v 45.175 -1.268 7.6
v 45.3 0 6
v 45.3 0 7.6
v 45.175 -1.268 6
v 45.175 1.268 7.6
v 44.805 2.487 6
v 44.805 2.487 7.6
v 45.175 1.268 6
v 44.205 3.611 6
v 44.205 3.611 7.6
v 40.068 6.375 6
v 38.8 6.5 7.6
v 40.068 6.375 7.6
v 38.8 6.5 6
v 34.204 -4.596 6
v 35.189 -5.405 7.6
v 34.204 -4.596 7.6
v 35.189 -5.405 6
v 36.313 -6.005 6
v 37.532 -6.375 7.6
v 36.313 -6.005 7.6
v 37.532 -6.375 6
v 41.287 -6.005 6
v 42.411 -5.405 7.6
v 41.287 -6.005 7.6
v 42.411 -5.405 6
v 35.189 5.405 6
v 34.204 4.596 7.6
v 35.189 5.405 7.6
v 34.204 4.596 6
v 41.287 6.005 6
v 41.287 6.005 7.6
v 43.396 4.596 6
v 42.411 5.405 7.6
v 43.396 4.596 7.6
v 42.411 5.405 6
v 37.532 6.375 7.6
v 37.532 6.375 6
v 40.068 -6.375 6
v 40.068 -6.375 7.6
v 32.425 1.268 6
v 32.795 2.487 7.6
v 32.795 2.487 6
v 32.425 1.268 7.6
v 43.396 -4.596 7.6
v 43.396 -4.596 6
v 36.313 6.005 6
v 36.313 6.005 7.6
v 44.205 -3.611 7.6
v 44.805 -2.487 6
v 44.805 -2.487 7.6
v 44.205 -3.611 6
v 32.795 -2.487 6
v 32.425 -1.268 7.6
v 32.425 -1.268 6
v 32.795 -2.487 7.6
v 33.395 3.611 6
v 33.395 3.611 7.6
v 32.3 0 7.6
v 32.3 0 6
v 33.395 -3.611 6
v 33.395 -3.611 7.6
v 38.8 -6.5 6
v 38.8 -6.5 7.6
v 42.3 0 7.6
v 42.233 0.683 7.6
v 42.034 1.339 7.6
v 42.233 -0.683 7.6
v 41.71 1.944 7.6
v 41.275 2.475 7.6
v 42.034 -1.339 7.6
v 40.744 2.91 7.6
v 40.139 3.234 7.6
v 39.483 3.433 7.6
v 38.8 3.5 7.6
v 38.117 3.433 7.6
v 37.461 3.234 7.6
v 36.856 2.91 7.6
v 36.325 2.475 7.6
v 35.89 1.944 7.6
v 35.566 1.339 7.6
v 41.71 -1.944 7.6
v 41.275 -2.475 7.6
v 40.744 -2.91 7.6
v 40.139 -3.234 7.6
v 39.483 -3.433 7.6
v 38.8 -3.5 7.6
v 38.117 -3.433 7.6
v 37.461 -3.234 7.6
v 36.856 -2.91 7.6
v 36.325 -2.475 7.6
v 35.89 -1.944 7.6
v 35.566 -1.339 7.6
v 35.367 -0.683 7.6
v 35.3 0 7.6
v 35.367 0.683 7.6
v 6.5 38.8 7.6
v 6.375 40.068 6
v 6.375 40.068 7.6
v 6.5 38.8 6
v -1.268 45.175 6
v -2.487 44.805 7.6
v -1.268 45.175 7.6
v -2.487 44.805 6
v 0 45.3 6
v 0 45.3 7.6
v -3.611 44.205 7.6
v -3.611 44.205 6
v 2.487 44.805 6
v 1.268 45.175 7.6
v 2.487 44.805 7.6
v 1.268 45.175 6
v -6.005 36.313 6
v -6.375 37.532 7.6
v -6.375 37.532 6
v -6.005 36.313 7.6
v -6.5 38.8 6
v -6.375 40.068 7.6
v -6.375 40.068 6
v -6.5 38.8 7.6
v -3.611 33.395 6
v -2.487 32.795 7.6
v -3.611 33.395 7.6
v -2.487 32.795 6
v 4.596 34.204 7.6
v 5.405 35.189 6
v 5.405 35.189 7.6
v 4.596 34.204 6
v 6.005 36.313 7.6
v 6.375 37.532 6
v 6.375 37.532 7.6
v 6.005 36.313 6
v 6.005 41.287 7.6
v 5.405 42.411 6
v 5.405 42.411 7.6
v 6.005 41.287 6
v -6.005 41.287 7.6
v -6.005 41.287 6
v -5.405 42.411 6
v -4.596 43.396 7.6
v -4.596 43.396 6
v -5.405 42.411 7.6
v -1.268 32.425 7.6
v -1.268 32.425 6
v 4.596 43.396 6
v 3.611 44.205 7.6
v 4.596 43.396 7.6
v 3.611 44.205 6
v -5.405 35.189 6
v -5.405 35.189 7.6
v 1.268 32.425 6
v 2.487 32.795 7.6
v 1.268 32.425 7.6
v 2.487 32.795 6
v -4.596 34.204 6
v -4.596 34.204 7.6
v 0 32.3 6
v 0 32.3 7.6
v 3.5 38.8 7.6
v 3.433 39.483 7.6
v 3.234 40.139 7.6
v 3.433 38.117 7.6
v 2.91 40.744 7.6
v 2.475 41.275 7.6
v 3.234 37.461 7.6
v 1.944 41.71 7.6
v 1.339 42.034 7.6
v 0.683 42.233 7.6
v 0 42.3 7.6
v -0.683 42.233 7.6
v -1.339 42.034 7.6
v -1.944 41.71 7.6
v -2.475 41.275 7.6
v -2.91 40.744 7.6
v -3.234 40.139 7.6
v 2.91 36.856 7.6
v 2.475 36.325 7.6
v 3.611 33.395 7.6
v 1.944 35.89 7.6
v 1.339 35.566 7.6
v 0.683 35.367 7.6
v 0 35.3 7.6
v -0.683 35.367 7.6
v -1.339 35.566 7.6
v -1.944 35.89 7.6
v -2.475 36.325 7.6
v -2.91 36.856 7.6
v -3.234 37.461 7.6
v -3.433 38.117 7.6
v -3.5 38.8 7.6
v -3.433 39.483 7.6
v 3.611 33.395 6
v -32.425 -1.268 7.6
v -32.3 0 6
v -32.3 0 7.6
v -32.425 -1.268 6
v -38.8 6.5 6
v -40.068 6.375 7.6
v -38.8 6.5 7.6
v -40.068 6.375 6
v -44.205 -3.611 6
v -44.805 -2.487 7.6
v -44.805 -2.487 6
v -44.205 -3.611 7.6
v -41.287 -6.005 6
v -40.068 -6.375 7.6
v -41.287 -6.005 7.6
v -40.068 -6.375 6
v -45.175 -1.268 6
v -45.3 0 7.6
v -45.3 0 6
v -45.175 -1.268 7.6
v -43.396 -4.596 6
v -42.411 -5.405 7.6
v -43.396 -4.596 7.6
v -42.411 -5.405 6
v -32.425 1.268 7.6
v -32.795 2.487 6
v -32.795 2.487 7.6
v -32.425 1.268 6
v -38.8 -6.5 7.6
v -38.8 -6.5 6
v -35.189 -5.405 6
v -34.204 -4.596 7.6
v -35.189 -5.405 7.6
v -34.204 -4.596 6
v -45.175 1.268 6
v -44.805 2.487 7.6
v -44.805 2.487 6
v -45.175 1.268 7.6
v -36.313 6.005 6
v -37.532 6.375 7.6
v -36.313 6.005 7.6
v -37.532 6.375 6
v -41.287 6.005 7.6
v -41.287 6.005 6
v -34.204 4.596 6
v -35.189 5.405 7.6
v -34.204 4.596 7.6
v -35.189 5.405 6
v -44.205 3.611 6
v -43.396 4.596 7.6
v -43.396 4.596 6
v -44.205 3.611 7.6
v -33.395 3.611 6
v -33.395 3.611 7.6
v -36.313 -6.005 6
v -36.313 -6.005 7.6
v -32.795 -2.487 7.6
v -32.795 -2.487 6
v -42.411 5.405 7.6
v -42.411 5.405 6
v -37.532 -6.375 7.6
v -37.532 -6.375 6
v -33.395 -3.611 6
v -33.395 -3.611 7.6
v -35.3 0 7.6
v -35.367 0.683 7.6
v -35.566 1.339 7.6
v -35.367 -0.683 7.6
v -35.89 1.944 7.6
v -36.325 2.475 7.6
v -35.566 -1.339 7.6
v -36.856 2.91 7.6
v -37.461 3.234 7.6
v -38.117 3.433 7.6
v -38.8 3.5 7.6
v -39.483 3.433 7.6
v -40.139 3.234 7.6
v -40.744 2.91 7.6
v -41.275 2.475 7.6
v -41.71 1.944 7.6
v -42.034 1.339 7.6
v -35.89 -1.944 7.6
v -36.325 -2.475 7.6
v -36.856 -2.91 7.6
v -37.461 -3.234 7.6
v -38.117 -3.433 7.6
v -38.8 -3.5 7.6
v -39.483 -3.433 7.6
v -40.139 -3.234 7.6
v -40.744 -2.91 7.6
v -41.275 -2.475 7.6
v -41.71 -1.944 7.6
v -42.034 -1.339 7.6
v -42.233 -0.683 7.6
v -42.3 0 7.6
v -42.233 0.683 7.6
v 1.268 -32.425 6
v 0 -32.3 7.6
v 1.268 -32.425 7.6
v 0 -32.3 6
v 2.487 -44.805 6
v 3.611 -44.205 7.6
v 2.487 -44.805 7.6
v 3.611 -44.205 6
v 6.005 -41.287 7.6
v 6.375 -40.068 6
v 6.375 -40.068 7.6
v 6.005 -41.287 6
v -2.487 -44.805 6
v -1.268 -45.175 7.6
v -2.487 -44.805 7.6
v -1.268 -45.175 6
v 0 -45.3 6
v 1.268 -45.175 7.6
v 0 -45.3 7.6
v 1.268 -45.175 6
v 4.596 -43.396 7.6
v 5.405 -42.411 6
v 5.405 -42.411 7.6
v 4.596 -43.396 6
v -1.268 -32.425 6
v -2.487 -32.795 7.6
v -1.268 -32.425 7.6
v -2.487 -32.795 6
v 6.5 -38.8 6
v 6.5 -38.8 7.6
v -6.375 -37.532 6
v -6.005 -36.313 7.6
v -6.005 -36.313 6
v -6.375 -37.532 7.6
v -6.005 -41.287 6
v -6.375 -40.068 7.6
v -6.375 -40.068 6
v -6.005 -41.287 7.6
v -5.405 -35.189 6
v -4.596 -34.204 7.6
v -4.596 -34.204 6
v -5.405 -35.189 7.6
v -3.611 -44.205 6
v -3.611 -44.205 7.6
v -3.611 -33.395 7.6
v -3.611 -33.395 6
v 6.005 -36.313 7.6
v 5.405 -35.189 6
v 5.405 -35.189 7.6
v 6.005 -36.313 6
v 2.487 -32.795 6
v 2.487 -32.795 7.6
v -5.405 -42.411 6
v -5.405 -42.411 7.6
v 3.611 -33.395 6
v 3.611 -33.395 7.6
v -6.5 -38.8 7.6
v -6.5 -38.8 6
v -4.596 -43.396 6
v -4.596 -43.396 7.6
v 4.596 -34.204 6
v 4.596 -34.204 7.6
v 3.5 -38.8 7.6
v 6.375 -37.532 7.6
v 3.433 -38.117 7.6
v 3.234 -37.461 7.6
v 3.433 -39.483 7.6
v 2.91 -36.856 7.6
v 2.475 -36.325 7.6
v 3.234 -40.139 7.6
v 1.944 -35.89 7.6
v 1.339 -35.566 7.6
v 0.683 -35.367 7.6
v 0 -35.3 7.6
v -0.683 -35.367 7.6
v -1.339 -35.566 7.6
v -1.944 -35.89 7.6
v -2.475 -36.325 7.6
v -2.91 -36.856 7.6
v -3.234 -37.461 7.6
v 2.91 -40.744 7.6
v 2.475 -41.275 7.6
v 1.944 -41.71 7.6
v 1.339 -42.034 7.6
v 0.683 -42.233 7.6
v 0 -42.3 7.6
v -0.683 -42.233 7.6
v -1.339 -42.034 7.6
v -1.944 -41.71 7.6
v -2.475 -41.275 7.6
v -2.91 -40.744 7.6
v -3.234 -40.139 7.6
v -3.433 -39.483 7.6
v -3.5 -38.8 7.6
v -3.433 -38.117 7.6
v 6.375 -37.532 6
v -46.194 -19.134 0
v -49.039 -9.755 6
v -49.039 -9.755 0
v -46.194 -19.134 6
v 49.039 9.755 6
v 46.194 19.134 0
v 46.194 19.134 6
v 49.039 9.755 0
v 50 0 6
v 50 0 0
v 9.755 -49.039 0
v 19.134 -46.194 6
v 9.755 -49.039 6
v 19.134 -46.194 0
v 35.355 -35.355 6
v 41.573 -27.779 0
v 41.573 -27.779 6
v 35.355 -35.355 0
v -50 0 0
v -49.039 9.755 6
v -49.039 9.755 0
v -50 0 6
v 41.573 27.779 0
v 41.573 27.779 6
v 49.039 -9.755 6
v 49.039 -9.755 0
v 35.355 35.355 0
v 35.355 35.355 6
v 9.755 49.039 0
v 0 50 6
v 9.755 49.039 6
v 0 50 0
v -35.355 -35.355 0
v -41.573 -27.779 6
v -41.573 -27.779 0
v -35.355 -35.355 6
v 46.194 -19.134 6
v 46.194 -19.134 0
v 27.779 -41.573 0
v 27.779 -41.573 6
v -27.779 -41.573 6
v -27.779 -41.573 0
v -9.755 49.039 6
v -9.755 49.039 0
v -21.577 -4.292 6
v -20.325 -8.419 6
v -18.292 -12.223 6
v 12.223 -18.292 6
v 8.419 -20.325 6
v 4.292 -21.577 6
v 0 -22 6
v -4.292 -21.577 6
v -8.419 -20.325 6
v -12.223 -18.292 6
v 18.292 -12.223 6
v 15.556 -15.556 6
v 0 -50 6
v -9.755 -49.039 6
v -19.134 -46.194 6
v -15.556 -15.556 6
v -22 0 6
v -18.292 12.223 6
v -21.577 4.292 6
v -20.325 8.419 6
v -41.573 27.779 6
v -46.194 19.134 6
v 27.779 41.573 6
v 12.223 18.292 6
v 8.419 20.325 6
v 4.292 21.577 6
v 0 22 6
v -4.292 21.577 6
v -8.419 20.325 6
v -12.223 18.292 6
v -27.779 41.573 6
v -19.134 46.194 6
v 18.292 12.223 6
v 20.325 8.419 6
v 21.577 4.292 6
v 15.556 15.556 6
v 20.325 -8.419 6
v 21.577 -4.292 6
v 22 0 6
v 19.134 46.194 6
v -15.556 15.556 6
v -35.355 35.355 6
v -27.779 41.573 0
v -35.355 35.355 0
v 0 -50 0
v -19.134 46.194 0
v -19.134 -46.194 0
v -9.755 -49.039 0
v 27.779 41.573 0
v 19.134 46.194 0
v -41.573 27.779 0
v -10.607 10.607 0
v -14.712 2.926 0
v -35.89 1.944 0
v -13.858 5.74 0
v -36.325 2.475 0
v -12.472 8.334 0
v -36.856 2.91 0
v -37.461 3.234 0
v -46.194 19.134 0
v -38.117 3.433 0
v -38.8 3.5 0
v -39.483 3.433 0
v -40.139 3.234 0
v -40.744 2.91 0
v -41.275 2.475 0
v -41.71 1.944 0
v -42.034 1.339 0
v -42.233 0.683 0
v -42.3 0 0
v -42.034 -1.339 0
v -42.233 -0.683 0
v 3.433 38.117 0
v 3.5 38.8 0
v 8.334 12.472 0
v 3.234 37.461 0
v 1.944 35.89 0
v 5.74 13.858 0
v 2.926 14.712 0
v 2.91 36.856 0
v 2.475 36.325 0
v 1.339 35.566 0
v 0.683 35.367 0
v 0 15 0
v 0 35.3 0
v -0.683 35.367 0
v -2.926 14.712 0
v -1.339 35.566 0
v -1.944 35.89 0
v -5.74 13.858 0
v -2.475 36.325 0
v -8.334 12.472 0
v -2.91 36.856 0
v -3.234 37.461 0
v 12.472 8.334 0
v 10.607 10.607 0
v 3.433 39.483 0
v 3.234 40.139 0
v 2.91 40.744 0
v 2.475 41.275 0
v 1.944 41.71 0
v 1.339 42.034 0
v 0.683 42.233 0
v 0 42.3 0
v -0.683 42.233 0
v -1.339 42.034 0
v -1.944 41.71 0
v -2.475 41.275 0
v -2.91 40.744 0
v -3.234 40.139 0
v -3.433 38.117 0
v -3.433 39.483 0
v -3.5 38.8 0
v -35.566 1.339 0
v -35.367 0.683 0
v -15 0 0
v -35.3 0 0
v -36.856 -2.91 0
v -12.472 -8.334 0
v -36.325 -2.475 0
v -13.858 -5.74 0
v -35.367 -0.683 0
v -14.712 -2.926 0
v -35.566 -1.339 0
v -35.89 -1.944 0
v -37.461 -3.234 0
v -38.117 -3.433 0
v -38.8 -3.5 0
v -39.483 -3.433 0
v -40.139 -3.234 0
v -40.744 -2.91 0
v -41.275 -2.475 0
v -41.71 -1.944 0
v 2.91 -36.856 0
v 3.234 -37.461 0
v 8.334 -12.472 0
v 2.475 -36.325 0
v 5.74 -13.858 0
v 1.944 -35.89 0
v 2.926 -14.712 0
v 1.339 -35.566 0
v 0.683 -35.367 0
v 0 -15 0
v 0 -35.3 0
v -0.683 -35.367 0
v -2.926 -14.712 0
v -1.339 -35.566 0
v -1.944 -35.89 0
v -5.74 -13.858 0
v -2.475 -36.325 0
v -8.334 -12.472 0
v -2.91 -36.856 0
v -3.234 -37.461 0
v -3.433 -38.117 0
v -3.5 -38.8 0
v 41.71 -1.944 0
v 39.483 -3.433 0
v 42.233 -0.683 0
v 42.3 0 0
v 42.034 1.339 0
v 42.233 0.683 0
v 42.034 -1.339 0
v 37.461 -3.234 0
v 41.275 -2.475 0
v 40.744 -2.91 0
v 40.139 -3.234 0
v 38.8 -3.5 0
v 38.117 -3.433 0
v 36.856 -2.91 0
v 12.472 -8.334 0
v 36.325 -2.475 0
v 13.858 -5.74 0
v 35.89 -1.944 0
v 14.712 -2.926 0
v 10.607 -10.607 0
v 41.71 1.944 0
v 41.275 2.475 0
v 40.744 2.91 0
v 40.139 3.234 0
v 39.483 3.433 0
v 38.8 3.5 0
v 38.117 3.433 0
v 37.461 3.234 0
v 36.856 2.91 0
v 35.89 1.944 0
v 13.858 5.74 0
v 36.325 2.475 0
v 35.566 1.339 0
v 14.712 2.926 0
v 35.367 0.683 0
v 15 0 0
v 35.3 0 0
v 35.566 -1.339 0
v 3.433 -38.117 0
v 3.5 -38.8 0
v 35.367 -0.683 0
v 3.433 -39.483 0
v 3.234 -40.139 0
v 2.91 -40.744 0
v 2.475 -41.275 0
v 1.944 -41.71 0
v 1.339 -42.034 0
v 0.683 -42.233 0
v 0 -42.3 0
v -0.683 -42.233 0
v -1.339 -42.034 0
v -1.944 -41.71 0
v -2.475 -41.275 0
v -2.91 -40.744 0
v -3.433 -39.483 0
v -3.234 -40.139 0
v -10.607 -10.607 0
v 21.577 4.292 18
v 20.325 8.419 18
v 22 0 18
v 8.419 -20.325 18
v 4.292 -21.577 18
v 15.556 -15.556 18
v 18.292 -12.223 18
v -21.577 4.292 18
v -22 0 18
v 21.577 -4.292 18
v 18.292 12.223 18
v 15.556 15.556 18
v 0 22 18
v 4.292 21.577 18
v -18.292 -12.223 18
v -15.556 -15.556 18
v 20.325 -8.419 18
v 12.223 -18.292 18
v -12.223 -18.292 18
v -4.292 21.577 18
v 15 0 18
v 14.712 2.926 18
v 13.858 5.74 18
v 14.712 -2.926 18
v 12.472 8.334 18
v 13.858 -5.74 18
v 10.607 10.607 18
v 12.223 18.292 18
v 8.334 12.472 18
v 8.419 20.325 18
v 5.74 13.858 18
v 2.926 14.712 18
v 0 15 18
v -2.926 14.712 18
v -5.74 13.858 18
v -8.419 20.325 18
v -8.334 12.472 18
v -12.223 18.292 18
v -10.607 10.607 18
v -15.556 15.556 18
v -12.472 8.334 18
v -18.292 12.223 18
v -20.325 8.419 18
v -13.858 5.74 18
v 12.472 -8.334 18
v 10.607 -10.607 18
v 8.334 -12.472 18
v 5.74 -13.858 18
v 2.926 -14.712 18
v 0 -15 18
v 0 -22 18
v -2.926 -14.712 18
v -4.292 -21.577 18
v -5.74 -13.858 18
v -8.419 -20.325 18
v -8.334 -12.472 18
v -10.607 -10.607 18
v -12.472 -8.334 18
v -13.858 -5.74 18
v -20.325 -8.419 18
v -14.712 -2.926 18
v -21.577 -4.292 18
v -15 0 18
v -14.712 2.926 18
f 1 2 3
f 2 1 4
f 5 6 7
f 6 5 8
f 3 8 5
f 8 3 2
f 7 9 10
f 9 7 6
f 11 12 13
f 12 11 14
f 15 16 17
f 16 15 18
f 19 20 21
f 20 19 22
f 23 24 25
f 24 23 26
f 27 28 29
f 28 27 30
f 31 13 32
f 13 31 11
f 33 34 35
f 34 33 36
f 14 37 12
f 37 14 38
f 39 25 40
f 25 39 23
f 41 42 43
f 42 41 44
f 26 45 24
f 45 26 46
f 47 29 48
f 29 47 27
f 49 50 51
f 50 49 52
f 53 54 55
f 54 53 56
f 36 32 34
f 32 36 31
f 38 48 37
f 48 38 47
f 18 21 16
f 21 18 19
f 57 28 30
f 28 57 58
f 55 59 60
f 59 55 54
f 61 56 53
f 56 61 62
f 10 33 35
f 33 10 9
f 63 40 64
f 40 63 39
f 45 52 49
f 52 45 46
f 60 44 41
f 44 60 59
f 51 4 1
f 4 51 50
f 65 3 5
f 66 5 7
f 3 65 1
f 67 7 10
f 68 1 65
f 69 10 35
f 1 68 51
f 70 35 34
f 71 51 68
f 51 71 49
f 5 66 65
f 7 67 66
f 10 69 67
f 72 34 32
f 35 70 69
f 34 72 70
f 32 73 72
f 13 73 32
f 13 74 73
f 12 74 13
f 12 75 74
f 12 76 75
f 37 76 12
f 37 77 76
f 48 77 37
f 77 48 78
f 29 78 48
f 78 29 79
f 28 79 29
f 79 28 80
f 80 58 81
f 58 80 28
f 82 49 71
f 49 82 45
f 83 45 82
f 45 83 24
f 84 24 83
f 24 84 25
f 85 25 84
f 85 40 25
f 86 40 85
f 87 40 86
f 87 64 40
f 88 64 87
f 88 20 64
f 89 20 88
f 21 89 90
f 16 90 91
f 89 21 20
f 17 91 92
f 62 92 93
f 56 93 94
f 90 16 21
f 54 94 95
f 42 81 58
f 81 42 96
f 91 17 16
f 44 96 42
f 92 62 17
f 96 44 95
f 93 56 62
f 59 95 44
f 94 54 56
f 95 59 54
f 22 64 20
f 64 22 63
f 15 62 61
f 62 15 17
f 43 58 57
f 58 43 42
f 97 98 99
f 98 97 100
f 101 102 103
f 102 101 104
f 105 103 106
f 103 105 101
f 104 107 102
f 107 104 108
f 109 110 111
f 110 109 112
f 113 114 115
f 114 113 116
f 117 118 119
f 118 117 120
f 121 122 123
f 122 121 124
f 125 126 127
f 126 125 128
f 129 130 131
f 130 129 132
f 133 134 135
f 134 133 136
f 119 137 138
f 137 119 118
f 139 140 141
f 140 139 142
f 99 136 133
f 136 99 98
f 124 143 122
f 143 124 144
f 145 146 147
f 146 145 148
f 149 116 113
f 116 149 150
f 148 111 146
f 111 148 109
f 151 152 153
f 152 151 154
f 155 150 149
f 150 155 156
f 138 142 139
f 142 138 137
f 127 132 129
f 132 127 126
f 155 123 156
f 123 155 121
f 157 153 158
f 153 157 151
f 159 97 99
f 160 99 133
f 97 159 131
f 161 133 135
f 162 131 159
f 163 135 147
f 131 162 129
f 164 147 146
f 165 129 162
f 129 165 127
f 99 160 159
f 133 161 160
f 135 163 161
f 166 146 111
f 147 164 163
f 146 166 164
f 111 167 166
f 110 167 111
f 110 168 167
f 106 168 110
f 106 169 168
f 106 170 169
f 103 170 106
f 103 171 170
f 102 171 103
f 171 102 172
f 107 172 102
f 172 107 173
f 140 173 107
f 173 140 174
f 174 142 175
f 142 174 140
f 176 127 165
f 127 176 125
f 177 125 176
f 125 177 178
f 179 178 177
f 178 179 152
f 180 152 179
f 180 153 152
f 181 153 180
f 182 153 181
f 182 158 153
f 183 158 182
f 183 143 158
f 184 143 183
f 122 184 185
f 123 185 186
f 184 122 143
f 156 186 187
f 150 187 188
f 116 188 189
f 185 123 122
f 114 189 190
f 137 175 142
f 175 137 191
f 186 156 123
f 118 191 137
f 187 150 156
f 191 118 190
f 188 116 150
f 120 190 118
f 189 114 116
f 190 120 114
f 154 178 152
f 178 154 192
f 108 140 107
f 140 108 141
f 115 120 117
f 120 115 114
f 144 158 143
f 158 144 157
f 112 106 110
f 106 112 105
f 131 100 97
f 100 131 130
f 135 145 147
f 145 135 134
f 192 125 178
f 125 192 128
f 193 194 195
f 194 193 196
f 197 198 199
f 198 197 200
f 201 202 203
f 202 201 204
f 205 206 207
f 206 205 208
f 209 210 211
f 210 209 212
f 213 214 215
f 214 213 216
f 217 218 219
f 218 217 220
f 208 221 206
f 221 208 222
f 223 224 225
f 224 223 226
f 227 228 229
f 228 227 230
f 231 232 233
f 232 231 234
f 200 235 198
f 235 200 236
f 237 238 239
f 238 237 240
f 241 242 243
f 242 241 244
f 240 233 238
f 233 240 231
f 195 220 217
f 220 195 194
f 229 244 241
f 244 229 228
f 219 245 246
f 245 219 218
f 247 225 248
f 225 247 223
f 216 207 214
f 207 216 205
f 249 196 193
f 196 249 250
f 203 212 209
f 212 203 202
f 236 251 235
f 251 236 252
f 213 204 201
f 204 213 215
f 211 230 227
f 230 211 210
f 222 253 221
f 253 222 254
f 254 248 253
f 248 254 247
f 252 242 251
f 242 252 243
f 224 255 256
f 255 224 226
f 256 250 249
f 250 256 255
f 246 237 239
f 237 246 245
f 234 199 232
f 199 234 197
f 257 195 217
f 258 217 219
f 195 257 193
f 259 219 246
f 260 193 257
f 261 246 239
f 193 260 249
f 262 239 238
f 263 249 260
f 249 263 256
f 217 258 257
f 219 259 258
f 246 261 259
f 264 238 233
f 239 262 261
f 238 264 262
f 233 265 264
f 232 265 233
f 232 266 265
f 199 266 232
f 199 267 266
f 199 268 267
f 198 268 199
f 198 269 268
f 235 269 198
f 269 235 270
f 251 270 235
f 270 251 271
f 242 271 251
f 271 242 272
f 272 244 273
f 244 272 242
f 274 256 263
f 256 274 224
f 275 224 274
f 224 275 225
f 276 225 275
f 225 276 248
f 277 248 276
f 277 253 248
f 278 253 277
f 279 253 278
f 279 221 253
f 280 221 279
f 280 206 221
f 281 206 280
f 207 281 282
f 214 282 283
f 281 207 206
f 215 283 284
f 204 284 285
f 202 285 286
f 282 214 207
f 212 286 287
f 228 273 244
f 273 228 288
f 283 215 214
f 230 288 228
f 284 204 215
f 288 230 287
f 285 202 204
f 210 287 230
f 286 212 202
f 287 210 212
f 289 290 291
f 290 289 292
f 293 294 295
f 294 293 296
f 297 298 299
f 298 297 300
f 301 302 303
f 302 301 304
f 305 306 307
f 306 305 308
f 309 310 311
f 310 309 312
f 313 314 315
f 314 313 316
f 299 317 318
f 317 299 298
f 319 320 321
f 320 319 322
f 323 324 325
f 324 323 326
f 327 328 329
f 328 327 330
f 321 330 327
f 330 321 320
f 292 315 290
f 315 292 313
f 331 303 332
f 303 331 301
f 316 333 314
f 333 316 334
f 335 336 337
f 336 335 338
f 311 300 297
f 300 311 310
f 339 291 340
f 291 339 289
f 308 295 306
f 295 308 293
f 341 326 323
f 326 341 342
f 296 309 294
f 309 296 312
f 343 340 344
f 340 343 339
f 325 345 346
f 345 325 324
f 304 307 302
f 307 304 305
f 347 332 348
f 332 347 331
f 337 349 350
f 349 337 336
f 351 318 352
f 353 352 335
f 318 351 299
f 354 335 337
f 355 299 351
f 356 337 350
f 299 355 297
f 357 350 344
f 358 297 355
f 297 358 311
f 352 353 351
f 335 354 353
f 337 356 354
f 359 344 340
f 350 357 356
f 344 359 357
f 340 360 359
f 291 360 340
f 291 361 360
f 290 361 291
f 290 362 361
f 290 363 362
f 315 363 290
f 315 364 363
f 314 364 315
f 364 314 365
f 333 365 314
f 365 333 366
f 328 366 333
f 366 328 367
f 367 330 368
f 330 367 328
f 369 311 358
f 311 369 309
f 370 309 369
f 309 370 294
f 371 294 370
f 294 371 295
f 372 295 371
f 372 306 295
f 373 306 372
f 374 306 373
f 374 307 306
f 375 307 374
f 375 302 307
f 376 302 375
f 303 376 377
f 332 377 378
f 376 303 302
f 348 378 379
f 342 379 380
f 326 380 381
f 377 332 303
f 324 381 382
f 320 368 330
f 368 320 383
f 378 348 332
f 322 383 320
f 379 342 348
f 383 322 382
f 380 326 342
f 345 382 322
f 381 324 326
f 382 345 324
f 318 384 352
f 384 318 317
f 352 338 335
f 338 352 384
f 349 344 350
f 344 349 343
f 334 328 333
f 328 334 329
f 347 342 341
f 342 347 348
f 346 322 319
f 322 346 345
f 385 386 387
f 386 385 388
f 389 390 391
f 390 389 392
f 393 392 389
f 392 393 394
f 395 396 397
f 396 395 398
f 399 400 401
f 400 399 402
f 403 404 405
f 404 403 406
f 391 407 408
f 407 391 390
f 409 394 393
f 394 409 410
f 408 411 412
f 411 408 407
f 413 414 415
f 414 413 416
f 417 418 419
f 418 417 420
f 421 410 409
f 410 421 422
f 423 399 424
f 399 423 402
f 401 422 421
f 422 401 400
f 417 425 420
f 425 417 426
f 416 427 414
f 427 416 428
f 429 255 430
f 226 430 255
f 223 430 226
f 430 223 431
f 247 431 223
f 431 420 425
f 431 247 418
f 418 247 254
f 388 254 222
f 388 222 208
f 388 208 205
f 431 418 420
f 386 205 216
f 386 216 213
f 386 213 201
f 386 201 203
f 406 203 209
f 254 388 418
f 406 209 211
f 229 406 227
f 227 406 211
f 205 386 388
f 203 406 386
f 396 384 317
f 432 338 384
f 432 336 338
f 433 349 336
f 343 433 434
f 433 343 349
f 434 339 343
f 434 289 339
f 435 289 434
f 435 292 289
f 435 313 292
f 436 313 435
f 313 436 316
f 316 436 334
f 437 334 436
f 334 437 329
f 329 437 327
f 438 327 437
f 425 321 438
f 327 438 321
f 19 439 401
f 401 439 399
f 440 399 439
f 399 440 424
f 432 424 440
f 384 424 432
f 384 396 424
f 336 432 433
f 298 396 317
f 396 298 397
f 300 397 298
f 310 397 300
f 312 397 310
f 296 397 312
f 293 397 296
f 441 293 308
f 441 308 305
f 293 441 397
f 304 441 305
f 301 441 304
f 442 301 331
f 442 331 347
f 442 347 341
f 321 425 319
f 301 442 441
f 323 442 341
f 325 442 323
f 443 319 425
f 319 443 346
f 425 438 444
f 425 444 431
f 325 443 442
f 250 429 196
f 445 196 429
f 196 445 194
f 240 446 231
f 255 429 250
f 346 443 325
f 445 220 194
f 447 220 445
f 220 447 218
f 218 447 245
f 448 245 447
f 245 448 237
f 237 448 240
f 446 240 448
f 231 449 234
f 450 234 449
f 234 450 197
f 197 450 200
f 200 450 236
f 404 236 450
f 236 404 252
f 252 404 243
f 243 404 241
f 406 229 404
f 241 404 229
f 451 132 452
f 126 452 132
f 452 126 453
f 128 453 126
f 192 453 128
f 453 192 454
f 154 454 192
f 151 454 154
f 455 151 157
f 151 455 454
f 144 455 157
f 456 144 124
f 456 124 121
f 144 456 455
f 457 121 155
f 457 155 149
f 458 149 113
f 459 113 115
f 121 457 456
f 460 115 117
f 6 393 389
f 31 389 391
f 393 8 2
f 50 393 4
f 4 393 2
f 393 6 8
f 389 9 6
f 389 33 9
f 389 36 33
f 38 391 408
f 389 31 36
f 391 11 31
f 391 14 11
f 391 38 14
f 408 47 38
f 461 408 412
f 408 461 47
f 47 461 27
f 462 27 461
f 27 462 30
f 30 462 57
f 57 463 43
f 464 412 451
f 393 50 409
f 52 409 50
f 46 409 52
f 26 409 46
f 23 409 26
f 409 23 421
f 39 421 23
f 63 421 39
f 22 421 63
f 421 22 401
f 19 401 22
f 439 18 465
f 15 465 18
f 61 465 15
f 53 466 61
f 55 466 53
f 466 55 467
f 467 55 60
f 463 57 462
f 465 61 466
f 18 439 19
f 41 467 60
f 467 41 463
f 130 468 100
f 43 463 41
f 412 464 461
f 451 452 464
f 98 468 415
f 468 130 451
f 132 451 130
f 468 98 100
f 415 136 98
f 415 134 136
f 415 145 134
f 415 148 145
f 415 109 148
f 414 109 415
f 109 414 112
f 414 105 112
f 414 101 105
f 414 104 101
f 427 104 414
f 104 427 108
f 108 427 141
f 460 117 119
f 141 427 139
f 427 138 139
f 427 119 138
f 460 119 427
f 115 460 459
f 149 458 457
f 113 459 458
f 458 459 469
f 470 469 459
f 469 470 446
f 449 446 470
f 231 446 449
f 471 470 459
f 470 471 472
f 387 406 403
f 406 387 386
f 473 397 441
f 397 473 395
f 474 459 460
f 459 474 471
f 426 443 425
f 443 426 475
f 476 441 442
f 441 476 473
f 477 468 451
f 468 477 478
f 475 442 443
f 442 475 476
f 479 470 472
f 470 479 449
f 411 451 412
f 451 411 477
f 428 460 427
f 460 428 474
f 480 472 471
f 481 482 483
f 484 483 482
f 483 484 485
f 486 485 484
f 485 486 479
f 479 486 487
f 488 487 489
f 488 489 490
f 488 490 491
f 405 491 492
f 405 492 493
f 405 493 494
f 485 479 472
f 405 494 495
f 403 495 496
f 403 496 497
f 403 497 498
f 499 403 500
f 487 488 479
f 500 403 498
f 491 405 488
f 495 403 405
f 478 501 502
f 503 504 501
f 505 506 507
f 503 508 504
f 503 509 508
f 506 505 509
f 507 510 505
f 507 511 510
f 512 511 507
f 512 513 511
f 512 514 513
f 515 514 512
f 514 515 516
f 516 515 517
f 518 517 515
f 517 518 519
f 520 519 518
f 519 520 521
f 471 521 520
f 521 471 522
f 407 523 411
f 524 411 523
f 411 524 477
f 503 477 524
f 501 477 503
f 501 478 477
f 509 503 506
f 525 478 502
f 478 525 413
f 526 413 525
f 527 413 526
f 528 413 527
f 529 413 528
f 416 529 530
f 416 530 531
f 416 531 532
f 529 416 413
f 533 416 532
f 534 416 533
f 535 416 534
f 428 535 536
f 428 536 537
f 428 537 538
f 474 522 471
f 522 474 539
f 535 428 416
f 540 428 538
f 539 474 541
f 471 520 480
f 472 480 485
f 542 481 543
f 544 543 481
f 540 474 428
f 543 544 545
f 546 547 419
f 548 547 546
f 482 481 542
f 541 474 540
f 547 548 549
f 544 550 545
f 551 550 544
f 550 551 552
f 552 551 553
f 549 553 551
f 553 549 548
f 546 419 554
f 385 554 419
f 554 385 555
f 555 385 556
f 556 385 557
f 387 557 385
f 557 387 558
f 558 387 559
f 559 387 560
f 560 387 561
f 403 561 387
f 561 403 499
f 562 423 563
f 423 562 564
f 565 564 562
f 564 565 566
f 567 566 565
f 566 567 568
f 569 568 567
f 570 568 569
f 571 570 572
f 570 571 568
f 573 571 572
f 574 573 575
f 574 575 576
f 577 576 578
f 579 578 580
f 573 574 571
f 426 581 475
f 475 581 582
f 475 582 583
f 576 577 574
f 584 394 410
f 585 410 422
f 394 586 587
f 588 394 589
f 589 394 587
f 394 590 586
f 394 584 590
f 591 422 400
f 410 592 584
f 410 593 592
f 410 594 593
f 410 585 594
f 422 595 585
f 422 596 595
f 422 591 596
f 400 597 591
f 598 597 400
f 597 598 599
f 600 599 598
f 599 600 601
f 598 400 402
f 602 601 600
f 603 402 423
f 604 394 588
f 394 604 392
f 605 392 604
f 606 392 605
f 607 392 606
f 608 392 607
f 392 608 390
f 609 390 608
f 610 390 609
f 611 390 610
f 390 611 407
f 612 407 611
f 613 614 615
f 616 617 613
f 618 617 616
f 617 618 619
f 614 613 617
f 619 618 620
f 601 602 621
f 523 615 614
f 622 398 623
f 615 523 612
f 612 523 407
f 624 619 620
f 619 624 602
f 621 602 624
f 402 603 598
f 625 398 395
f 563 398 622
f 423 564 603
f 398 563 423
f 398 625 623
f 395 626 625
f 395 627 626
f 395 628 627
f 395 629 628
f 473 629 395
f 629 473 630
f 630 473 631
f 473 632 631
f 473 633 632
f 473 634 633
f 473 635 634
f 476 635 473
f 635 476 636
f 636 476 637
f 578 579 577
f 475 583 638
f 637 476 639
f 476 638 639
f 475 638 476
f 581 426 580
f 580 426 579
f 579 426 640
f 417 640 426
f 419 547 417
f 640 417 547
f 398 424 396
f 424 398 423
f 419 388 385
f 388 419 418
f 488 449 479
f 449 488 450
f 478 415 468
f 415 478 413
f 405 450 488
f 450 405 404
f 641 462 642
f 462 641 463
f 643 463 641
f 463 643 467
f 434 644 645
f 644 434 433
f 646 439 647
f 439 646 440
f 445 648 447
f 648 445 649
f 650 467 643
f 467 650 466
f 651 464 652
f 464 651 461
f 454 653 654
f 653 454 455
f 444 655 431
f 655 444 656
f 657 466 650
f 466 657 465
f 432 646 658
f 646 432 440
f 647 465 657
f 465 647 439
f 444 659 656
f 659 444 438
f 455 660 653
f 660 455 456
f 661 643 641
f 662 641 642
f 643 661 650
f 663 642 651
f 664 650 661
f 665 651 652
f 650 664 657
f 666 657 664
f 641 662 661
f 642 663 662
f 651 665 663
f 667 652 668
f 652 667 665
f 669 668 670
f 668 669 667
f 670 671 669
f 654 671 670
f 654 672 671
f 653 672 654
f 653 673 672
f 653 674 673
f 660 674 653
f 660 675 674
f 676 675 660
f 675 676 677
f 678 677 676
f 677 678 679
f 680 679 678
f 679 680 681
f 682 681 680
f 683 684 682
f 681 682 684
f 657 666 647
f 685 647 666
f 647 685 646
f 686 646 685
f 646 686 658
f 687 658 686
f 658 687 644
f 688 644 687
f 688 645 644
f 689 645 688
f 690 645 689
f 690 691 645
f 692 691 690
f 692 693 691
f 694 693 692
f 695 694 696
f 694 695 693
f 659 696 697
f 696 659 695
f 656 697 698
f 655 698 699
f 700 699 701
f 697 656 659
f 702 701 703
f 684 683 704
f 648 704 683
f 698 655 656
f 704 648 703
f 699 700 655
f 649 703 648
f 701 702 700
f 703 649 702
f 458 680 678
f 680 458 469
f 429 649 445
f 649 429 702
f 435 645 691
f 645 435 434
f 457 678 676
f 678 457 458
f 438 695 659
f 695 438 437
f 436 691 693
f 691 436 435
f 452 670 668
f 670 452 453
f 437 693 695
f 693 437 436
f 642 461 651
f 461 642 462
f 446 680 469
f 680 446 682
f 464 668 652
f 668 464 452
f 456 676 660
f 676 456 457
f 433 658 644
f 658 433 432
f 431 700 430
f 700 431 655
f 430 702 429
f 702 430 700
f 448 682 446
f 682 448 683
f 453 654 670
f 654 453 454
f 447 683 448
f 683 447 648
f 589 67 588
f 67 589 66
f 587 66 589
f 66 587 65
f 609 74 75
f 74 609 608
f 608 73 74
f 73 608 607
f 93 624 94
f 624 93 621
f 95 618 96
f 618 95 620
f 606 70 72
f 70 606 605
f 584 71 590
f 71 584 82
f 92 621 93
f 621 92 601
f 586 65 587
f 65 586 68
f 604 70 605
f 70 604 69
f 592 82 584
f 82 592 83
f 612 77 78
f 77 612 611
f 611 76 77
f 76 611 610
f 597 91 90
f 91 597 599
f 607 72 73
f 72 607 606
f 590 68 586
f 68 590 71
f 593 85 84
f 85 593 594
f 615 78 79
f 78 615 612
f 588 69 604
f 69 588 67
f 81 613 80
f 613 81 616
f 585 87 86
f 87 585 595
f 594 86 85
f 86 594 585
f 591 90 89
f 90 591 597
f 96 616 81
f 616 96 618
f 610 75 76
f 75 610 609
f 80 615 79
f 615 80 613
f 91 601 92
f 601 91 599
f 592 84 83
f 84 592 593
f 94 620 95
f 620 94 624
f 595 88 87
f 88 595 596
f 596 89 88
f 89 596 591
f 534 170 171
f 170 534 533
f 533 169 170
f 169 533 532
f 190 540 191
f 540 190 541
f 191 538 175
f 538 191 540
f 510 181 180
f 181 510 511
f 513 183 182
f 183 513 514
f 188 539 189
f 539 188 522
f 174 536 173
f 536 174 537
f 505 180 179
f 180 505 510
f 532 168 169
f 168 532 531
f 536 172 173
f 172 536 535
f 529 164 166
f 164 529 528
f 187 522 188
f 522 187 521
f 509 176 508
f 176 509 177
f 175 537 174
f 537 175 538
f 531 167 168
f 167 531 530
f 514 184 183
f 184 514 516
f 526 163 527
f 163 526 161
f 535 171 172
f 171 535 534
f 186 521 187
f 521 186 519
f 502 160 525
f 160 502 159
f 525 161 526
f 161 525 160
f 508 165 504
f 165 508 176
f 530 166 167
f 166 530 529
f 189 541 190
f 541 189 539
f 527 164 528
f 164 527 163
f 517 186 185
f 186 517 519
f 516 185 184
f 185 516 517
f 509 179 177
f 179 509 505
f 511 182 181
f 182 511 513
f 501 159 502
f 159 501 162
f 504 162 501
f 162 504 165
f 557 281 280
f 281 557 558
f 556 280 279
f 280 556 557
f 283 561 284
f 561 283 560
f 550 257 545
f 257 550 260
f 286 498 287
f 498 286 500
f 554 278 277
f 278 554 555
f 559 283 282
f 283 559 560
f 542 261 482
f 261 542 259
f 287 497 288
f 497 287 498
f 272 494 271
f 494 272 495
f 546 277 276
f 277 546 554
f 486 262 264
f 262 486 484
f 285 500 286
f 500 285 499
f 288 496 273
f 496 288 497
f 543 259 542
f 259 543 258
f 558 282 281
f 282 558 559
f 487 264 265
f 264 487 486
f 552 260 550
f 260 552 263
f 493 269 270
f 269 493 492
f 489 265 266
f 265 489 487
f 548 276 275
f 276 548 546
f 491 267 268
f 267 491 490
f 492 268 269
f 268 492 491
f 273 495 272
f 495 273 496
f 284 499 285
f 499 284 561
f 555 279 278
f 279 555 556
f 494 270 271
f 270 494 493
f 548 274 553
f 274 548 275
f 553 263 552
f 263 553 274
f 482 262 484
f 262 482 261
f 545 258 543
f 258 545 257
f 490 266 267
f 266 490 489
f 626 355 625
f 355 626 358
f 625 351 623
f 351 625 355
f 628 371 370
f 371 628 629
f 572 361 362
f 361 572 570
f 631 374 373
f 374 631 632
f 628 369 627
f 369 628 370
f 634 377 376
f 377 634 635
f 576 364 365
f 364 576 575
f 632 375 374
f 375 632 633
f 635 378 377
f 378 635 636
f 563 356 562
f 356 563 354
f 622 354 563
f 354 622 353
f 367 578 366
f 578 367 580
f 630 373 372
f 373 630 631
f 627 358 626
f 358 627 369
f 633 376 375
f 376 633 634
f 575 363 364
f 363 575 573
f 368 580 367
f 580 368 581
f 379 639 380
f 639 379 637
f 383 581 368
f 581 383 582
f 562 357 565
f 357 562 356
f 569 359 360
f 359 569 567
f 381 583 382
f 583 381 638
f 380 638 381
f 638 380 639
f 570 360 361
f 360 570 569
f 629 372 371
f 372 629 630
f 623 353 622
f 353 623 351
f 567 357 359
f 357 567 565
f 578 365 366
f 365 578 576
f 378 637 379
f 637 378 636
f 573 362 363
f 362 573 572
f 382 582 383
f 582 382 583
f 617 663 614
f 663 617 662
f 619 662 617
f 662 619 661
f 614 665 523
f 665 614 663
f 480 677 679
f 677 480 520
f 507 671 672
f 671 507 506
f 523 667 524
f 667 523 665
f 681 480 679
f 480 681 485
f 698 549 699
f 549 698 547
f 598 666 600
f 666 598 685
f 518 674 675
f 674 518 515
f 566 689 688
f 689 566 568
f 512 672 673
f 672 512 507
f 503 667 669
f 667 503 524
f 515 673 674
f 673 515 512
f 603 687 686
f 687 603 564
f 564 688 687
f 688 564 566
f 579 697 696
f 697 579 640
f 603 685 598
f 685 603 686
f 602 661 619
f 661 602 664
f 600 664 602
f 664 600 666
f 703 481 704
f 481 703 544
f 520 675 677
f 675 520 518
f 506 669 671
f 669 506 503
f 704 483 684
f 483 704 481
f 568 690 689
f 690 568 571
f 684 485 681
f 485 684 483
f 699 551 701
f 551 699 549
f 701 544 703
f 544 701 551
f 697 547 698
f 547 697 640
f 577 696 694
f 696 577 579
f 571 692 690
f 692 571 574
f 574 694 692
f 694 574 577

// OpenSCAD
$fn = 32;

// ----------------------------------------------------------------------
// Bolt-circle flange: 100 mm outside, 4 bolt holes, bore 30 mm
// ----------------------------------------------------------------------

// --- parameters (mm) ---
flange_d = 100;           // flange outside diameter
flange_t = 6;             // flange thickness
bolts = 4;                // number of bolt holes
bolt_d = 7;               // bolt clearance
bolt_r = 38.8;            // bolt circle radius
bore_d = 30;              // centre bore
hub_d = 44;               // raised hub diameter
hub_h = 12;               // raised hub height
spot_d = 13;              // spot faced bosses
spot_h = 1.6;             // spot face height

module body() {
  cylinder(h = flange_t, d = flange_d);
  /* raised hub, sunk 1 mm into the flange */
  translate([0, 0, flange_t - 1]) cylinder(h = hub_h + 1, d = hub_d);
  /* spot faced pads under the bolt heads */
  for (i = [0 : bolts - 1]) rotate([0, 0, i * 360 / bolts]) translate([bolt_r, 0, flange_t - 1]) cylinder(h = spot_h + 1, d = spot_d);
}

difference() {
  body();
  /* bolt circle */
  for (i = [0 : bolts - 1]) rotate([0, 0, i * 360 / bolts]) translate([bolt_r, 0, -1]) cylinder(h = flange_t + hub_h + 3, d = bolt_d);
  translate([0, 0, -1]) cylinder(h = flange_t + hub_h + 3, d = bore_d);
}
